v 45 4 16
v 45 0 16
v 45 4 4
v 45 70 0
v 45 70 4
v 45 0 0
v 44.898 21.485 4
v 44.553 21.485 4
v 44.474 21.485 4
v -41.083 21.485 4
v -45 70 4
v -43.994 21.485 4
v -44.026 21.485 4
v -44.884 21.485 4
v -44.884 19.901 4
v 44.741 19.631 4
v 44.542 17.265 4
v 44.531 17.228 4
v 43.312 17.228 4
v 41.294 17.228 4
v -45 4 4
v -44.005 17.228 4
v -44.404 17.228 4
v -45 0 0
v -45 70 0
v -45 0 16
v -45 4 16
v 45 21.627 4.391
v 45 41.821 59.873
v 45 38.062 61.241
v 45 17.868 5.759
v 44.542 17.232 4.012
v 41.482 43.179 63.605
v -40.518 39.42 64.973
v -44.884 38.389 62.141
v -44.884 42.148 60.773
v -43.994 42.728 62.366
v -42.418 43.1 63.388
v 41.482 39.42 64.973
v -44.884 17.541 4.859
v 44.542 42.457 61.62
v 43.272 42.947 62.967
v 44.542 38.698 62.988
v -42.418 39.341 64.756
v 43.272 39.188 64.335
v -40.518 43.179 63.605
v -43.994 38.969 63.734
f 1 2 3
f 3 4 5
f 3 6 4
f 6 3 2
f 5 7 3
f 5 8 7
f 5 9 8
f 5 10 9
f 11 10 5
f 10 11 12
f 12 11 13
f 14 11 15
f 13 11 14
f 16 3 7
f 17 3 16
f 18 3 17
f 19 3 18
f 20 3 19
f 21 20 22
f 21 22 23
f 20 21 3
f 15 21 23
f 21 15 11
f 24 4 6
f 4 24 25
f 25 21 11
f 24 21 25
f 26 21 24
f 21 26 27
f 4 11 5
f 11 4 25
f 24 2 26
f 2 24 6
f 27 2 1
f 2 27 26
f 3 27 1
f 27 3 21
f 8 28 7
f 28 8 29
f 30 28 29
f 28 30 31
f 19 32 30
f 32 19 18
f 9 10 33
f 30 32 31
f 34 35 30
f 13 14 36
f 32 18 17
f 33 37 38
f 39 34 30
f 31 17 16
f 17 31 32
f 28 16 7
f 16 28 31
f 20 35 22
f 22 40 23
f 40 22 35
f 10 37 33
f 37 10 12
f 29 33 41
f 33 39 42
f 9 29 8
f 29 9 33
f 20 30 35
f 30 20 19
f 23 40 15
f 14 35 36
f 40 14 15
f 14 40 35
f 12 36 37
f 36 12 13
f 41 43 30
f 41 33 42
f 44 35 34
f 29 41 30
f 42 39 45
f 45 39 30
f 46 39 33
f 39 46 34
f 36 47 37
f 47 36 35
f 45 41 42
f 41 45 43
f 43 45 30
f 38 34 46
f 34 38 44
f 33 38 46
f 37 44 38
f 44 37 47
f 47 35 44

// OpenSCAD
// orcad: wedge stand that holds a phone or small tablet upright in a slot.
stand_width = 90;
stand_depth = 70;
stand_height = 65;
lean_angle = 20;
wall_thickness = 4;
base_thickness = 4;
lip_height = 12;
device_thickness = 11;
slot_clearance = 1.5;

slot_gap = device_thickness + slot_clearance;
slot_back_y = wall_thickness + slot_gap;
panel_root = max(0, base_thickness - 2);
corner_r = min(wall_thickness, 6);
back_length = (stand_height - panel_root) / cos(lean_angle) - corner_r;
base_y = max(stand_depth, slot_back_y + wall_thickness + 10);

// The leaning back panel: rounded top corners, rounded upper body, flat end sunk into the base.
module back_panel() {
    translate([0, slot_back_y, panel_root])
        rotate([-lean_angle, 0, 0])
            hull()
                for (x = [corner_r, stand_width - corner_r], z = [corner_r, back_length])
                    translate([x, wall_thickness, z])
                        rotate([90, 0, 0])
                            cylinder(d = 2 * corner_r, h = wall_thickness);
}

translate([-stand_width / 2, 0, 0])
    union() {
        cube([stand_width, base_y, base_thickness]);
        cube([stand_width, wall_thickness, base_thickness + lip_height]);
        back_panel();
    }
